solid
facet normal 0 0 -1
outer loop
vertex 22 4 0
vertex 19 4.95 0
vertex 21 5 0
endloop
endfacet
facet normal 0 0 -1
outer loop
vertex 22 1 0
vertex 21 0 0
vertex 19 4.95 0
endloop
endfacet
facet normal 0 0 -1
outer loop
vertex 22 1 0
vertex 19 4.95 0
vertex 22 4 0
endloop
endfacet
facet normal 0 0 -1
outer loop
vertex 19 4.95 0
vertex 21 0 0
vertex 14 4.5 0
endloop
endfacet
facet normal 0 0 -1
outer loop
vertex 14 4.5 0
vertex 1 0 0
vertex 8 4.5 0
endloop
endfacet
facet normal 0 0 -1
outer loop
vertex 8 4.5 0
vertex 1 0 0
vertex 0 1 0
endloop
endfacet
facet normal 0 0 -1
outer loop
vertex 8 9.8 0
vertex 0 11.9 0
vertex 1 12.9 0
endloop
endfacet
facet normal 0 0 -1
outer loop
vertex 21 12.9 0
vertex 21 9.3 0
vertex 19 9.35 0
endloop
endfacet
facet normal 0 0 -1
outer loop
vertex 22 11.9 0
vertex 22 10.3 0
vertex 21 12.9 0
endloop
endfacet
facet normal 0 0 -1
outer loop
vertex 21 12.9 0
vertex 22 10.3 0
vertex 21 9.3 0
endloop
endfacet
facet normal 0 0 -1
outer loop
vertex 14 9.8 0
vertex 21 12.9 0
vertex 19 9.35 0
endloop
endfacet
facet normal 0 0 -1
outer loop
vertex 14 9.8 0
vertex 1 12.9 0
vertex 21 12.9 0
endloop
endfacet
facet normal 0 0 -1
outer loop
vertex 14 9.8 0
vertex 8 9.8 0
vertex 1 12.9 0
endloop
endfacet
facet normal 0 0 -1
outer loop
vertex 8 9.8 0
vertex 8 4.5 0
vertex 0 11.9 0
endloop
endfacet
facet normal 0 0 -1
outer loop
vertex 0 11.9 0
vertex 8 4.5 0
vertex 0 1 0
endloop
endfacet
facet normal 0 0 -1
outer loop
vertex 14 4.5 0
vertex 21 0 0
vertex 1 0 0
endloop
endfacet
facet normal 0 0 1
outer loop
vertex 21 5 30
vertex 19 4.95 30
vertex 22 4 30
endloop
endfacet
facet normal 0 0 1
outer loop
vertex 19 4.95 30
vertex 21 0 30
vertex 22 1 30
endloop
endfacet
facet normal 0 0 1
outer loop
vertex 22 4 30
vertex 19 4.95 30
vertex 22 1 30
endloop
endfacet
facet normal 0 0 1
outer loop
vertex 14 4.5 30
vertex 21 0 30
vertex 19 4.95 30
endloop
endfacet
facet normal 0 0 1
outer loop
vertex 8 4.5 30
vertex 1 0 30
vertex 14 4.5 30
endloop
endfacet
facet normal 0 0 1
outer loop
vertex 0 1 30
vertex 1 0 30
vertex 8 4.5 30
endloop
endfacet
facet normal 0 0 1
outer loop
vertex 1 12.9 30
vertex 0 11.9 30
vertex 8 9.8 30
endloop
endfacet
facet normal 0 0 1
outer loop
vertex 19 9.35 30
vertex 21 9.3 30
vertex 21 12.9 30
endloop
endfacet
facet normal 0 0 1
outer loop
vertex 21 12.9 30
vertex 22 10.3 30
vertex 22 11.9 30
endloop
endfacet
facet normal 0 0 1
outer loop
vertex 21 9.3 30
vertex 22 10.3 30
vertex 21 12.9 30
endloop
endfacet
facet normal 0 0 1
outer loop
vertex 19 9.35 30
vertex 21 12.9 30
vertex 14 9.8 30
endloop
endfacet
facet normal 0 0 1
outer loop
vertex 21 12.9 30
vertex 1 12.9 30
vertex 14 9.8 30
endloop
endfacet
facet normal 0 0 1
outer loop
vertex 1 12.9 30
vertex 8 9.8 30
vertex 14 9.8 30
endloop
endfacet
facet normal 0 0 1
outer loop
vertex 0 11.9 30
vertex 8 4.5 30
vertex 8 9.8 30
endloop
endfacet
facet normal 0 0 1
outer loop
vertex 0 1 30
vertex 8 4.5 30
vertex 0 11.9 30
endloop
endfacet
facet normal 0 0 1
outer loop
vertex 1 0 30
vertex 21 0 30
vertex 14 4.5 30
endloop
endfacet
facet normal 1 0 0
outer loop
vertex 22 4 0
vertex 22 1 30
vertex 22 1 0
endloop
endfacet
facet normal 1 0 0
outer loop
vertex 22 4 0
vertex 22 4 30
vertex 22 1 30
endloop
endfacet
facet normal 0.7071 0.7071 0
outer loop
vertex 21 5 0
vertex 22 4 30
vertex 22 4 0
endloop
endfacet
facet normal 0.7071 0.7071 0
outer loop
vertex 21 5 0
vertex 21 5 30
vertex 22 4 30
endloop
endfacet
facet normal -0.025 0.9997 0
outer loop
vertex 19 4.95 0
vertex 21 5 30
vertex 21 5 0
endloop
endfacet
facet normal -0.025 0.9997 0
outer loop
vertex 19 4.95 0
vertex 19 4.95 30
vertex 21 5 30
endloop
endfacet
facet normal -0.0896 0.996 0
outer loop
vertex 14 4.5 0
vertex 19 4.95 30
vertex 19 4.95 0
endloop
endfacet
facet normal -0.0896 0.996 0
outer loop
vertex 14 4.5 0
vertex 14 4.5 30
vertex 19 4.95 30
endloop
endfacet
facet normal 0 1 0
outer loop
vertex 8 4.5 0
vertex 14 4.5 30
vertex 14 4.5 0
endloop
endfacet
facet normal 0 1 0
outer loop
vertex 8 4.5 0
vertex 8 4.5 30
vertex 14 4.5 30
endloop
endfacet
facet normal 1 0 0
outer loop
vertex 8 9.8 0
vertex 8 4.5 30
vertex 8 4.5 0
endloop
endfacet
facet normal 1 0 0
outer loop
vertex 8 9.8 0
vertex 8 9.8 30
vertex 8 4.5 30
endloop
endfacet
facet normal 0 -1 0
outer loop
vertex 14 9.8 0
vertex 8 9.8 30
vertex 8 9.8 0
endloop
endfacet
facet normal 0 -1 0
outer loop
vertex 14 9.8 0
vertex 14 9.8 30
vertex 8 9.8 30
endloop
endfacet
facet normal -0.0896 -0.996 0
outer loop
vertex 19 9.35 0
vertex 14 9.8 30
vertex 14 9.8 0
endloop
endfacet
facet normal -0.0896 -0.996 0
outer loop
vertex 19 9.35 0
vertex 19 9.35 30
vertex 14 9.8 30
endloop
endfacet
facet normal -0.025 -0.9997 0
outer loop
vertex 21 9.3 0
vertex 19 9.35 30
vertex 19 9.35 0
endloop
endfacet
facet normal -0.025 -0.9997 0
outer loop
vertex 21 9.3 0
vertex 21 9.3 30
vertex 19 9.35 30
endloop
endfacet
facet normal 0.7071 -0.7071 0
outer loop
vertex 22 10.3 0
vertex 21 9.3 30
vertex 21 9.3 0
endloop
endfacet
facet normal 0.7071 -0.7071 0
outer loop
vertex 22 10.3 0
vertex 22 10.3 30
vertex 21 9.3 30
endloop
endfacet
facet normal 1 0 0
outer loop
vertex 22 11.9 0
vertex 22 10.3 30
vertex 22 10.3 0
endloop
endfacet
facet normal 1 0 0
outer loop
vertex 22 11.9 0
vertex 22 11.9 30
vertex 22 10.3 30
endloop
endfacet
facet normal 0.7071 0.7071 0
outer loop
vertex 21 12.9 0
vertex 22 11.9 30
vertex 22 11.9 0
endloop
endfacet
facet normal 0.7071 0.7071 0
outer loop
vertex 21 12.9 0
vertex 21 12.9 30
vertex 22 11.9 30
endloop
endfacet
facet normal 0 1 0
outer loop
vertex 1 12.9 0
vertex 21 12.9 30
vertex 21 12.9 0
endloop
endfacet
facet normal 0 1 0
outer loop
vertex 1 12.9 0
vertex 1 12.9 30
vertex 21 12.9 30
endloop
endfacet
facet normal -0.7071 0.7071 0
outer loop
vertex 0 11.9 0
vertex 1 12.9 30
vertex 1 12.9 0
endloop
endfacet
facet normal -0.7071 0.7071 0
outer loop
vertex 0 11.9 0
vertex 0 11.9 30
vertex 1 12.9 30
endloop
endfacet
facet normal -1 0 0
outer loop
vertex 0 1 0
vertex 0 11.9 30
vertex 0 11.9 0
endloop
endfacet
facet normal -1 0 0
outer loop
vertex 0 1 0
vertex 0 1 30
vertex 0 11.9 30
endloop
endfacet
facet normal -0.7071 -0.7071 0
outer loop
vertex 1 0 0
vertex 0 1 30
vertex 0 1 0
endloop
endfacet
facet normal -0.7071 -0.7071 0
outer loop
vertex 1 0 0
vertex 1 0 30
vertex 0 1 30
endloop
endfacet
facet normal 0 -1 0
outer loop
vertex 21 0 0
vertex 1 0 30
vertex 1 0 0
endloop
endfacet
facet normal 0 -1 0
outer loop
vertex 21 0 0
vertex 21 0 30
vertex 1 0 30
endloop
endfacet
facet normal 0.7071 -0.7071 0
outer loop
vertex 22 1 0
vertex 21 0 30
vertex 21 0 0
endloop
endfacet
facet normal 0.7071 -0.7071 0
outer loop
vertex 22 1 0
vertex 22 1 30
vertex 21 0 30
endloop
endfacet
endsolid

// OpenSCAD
// [FL_INDEX: keywords="openscad, 3d_parametric, Heizbettklammer_-_Heatbedclamp_-_NOW_Customizable, csg_solid" | COT="Parametric OpenSCAD design from 3DCodeverse"]
// Title: Heizbettklammer - Heatbedclamp - NOW Customizable

//DIe Laenge der Klammer
laenge=30;

//Weite der Basis
wbase=8;
//Weite des Arms oben (der Druckpunkt liegt etwas zurueck)
warmtop=14;
//Weite des Arms unten
warmbottom=14;

// Betthoehe (der Druck muss selbst eingerechnet werden zB 0.6 abziehen)
hbed=4.3;   
//Hoehe Arm oben (mehr als 4 geht beim Mendel90 nicht)
harmtop=3.6; 
//Hoehe Arm unten
harmbottom=5;

hall=hbed+harmtop+harmbottom;

	      	linear_extrude(height=laenge)
		      polygon(
		         points=[[0,1],
                       [0,hall-1],
                       [1,hall],
                       [wbase,hall],
                       [wbase+warmtop-1,hall],
                       [wbase+warmtop,hall-1],
                       [wbase+warmtop,hall-harmtop+1],
                       [wbase+warmtop-1,hall-harmtop],
                       [wbase+warmtop-3,hall-harmtop+0.05],
                       [wbase+warmtop-8,hall-harmtop+0.5],
                       [wbase,hall-harmtop+0.5],
                       
                       [wbase,harmbottom-0.5],
                       [wbase+warmbottom-8,harmbottom-0.5],
                       [wbase+warmbottom-3,harmbottom-0.05],
                       [wbase+warmbottom-1,harmbottom],
                       [wbase+warmbottom,harmbottom-1],
                       [wbase+warmbottom,1],
                       [wbase+warmbottom-1,0],
                       [wbase,0],
                       [1,0]
                       
                       ] 
                   );
